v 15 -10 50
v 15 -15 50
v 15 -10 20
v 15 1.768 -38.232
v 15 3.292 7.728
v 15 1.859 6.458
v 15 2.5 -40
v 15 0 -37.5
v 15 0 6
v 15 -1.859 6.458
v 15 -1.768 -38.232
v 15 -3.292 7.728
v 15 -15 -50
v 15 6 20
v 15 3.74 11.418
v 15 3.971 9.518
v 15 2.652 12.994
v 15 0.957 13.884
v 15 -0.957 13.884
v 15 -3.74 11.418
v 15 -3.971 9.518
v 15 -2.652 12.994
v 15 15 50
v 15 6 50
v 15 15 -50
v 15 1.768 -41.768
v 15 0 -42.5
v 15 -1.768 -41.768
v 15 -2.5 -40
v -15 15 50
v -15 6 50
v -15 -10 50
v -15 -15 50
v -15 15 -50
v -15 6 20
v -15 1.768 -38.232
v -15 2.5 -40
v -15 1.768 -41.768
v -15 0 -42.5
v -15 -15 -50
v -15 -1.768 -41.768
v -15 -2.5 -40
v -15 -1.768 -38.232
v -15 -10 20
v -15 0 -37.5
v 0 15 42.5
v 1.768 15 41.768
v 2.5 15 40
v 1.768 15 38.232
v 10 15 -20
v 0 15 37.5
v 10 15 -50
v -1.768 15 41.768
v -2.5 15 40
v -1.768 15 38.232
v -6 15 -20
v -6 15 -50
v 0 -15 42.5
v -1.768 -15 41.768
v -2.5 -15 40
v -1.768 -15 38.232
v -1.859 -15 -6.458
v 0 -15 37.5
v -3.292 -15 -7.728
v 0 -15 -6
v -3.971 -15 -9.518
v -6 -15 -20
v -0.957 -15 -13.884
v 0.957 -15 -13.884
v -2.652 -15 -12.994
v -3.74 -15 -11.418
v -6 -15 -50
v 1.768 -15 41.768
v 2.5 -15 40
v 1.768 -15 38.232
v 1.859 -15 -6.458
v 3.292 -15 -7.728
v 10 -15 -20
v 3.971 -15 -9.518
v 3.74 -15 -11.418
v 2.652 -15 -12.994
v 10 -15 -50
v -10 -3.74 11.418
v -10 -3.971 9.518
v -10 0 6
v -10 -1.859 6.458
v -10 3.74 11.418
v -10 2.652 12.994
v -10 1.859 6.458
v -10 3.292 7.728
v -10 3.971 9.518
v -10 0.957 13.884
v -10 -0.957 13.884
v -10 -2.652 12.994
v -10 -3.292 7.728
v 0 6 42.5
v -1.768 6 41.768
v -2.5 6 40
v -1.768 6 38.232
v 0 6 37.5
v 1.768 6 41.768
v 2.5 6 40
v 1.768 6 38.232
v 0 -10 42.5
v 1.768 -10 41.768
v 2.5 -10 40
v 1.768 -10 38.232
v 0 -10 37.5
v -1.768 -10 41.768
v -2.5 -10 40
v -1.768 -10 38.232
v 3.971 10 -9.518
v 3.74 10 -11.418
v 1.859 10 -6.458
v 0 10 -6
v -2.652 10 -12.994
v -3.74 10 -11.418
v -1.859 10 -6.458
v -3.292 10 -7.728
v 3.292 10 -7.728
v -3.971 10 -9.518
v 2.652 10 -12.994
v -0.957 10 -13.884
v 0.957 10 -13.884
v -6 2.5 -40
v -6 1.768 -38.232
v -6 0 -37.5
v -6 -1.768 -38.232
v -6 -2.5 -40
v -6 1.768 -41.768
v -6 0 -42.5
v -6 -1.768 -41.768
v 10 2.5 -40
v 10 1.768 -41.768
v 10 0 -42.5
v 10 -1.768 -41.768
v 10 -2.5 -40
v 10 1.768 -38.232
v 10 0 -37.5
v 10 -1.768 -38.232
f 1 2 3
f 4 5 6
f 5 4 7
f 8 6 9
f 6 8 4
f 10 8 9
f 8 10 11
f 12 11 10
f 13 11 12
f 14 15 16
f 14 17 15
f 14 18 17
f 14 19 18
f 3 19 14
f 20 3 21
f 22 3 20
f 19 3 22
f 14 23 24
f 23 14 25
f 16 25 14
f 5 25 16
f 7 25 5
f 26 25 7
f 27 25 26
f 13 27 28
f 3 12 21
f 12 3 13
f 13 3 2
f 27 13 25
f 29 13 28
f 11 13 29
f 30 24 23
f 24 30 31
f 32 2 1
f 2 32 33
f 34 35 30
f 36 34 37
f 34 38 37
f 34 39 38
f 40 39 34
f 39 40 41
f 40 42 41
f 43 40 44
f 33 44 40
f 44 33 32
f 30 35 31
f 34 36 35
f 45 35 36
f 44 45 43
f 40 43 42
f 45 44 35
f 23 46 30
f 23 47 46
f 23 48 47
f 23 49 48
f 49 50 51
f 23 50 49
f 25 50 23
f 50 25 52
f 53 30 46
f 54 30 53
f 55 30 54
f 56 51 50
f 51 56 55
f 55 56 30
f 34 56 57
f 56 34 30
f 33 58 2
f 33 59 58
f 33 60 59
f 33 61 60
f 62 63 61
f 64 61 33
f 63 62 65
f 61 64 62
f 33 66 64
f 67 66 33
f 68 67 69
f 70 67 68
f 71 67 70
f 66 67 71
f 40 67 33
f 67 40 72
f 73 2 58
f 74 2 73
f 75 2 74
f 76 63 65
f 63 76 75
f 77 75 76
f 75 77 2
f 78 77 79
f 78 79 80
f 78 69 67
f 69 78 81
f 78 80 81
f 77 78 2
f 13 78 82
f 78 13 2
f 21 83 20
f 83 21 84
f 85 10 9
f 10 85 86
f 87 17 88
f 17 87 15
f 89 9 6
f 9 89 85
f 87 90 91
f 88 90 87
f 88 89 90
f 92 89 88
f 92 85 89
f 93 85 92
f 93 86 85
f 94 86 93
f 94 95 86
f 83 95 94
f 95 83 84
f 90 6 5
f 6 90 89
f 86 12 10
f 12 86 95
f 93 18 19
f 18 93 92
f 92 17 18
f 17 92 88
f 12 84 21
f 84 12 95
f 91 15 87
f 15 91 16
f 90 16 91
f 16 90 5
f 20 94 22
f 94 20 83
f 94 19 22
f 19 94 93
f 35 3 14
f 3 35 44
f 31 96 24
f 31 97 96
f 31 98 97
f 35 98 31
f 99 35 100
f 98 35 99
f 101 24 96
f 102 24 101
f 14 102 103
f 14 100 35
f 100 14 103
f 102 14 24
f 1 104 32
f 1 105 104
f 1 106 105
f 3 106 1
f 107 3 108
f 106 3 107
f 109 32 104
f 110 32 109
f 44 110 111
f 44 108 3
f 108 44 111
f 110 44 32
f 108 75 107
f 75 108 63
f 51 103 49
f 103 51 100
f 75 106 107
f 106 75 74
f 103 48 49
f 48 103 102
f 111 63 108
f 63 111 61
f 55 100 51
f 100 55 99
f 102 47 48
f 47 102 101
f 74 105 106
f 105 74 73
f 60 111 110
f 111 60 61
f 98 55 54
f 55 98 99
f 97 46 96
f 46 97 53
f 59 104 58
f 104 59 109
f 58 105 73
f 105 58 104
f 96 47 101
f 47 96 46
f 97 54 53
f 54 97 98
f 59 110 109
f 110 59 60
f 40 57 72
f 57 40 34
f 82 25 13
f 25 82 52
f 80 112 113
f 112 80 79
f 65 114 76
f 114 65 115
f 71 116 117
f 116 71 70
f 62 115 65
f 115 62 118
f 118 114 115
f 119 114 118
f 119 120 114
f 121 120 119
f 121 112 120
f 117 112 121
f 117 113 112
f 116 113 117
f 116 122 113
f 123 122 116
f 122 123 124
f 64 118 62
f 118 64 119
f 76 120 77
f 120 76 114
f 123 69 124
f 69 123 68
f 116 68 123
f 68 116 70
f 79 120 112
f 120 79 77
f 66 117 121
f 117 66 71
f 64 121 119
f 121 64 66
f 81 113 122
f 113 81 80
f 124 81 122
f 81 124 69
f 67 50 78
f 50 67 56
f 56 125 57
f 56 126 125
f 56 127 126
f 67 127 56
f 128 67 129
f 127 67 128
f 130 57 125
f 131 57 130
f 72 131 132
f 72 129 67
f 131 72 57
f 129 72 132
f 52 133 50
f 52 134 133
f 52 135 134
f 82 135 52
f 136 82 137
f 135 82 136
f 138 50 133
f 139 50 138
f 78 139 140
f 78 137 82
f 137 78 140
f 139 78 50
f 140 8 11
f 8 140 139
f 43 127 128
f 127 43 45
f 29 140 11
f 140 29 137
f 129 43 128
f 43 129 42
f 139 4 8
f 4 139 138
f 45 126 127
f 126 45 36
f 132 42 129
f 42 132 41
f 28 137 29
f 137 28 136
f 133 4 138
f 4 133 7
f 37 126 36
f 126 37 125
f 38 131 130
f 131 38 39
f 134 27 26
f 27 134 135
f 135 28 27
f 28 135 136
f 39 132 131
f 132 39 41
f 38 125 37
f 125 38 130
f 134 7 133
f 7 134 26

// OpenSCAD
mg = 0; //0.7;

bh = 50;

module tour() {
	translate([-15, -15, 0])
	difference() {
	   cube([30, 30,  bh], false);
		translate([5, 15, 10]) {
		rotate(90, [0, 1, 0]) {
			  # cylinder(26, 4 + mg, 4 + mg, false);
			}
		}
		translate([0, 5, bh - 30])
		# cube([30, 16, 30]);
		translate([15, 0, bh - 10]) {
		rotate(270, [1, 0, 0]) {
  	   # cylinder(30, 2.5 + mg, 2.5 + mg, false);
		}
		}
	}
}


tour();
rotate(180, [1, 0, 0]) {
	rotate(90, [0, 0, 1])
	tour();
}

/*
module socle_roulement() {
	difference() {
		cube([20, 24, 10]);
		translate([10, 12, 10]) {
		  rotate(90, [1, 0, 0]) {
		    cylinder(20 + mg, 7.5 + mg, 7.5 + mg, true);
		    cylinder(24, 6 + mg, 6 + mg, true);
		  }			
		}
		translate([0, 3, 0]) cube([1, 3, 10]);		
		translate([19, 3, 0]) cube([1, 3, 10]);		
		translate([0, 24-3-3, 0]) cube([1, 3, 10]);		
		translate([19, 24-3-3, 0]) cube([1, 3, 10]);		
	}
}

module socle_barre() {
	difference() {
		translate([0, -6, 0]) {
			cube([10, 12, 10]);
		}
		translate([0, 0, 10]) {
			rotate(90, [0, 1, 0]) {
				cylinder(10, 4 + mg, 4 + mg);
			}
		}
		translate([3, -6, 0]) cube([3, 1, 10]);		
		translate([3, 6-1, 0]) cube([3, 1, 10]);		
	}
}

module support1() {

	union() {
		socle_roulement();
		translate([20, 12, 0]) {
			socle_barre();
			// cube([10, 24, 3]);
		}
	}
}

support1();
*/
